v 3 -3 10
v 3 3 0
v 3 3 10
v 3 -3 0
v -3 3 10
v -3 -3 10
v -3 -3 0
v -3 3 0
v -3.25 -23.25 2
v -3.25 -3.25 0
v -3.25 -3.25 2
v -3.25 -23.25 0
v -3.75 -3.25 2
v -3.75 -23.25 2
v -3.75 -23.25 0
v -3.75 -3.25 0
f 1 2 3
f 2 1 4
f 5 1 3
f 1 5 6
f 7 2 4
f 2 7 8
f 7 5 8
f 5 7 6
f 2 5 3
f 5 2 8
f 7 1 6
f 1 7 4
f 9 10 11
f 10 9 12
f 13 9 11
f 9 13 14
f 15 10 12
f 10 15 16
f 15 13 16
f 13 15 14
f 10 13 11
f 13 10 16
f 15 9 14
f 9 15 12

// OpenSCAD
translate([0, 0, 5]) color([0,1,0,0.9]) cube([6, 6, 10], center=true);
translate([-3.5, -3.5, 1]) color([1,0,0]) cube([0.5, 0.5, 2], center=true);
translate([-3.5, -4.0, 1]) color([1,0,0]) cube([0.5, 0.5, 2], center=true);
translate([-3.5, -4.5, 1]) color([1,0,0]) cube([0.5, 0.5, 2], center=true);
translate([-3.5, -5.0, 1]) color([1,0,0]) cube([0.5, 0.5, 2], center=true);
translate([-3.5, -5.5, 1]) color([1,0,0]) cube([0.5, 0.5, 2], center=true);
translate([-3.5, -6.0, 1]) color([1,0,0]) cube([0.5, 0.5, 2], center=true);
translate([-3.5, -6.5, 1]) color([1,0,0]) cube([0.5, 0.5, 2], center=true);
translate([-3.5, -7.0, 1]) color([1,0,0]) cube([0.5, 0.5, 2], center=true);
translate([-3.5, -7.5, 1]) color([1,0,0]) cube([0.5, 0.5, 2], center=true);
translate([-3.5, -8.0, 1]) color([1,0,0]) cube([0.5, 0.5, 2], center=true);
translate([-3.5, -8.5, 1]) color([1,0,0]) cube([0.5, 0.5, 2], center=true);
translate([-3.5, -9.0, 1]) color([1,0,0]) cube([0.5, 0.5, 2], center=true);
translate([-3.5, -9.5, 1]) color([1,0,0]) cube([0.5, 0.5, 2], center=true);
translate([-3.5, -10.0, 1]) color([1,0,0]) cube([0.5, 0.5, 2], center=true);
translate([-3.5, -10.5, 1]) color([1,0,0]) cube([0.5, 0.5, 2], center=true);
translate([-3.5, -11.0, 1]) color([1,0,0]) cube([0.5, 0.5, 2], center=true);
translate([-3.5, -11.5, 1]) color([1,0,0]) cube([0.5, 0.5, 2], center=true);
translate([-3.5, -12.0, 1]) color([1,0,0]) cube([0.5, 0.5, 2], center=true);
translate([-3.5, -12.5, 1]) color([1,0,0]) cube([0.5, 0.5, 2], center=true);
translate([-3.5, -13.0, 1]) color([1,0,0]) cube([0.5, 0.5, 2], center=true);
translate([-3.5, -13.5, 1]) color([1,0,0]) cube([0.5, 0.5, 2], center=true);
translate([-3.5, -14.0, 1]) color([1,0,0]) cube([0.5, 0.5, 2], center=true);
translate([-3.5, -14.5, 1]) color([1,0,0]) cube([0.5, 0.5, 2], center=true);
translate([-3.5, -15.0, 1]) color([1,0,0]) cube([0.5, 0.5, 2], center=true);
translate([-3.5, -15.5, 1]) color([1,0,0]) cube([0.5, 0.5, 2], center=true);
translate([-3.5, -16.0, 1]) color([1,0,0]) cube([0.5, 0.5, 2], center=true);
translate([-3.5, -16.5, 1]) color([1,0,0]) cube([0.5, 0.5, 2], center=true);
translate([-3.5, -17.0, 1]) color([1,0,0]) cube([0.5, 0.5, 2], center=true);
translate([-3.5, -17.5, 1]) color([1,0,0]) cube([0.5, 0.5, 2], center=true);
translate([-3.5, -18.0, 1]) color([1,0,0]) cube([0.5, 0.5, 2], center=true);
translate([-3.5, -18.5, 1]) color([1,0,0]) cube([0.5, 0.5, 2], center=true);
translate([-3.5, -19.0, 1]) color([1,0,0]) cube([0.5, 0.5, 2], center=true);
translate([-3.5, -19.5, 1]) color([1,0,0]) cube([0.5, 0.5, 2], center=true);
translate([-3.5, -20.0, 1]) color([1,0,0]) cube([0.5, 0.5, 2], center=true);
translate([-3.5, -20.5, 1]) color([1,0,0]) cube([0.5, 0.5, 2], center=true);
translate([-3.5, -21.0, 1]) color([1,0,0]) cube([0.5, 0.5, 2], center=true);
translate([-3.5, -21.5, 1]) color([1,0,0]) cube([0.5, 0.5, 2], center=true);
translate([-3.5, -22.0, 1]) color([1,0,0]) cube([0.5, 0.5, 2], center=true);
translate([-3.5, -22.5, 1]) color([1,0,0]) cube([0.5, 0.5, 2], center=true);
translate([-3.5, -23.0, 1]) color([1,0,0]) cube([0.5, 0.5, 2], center=true);
